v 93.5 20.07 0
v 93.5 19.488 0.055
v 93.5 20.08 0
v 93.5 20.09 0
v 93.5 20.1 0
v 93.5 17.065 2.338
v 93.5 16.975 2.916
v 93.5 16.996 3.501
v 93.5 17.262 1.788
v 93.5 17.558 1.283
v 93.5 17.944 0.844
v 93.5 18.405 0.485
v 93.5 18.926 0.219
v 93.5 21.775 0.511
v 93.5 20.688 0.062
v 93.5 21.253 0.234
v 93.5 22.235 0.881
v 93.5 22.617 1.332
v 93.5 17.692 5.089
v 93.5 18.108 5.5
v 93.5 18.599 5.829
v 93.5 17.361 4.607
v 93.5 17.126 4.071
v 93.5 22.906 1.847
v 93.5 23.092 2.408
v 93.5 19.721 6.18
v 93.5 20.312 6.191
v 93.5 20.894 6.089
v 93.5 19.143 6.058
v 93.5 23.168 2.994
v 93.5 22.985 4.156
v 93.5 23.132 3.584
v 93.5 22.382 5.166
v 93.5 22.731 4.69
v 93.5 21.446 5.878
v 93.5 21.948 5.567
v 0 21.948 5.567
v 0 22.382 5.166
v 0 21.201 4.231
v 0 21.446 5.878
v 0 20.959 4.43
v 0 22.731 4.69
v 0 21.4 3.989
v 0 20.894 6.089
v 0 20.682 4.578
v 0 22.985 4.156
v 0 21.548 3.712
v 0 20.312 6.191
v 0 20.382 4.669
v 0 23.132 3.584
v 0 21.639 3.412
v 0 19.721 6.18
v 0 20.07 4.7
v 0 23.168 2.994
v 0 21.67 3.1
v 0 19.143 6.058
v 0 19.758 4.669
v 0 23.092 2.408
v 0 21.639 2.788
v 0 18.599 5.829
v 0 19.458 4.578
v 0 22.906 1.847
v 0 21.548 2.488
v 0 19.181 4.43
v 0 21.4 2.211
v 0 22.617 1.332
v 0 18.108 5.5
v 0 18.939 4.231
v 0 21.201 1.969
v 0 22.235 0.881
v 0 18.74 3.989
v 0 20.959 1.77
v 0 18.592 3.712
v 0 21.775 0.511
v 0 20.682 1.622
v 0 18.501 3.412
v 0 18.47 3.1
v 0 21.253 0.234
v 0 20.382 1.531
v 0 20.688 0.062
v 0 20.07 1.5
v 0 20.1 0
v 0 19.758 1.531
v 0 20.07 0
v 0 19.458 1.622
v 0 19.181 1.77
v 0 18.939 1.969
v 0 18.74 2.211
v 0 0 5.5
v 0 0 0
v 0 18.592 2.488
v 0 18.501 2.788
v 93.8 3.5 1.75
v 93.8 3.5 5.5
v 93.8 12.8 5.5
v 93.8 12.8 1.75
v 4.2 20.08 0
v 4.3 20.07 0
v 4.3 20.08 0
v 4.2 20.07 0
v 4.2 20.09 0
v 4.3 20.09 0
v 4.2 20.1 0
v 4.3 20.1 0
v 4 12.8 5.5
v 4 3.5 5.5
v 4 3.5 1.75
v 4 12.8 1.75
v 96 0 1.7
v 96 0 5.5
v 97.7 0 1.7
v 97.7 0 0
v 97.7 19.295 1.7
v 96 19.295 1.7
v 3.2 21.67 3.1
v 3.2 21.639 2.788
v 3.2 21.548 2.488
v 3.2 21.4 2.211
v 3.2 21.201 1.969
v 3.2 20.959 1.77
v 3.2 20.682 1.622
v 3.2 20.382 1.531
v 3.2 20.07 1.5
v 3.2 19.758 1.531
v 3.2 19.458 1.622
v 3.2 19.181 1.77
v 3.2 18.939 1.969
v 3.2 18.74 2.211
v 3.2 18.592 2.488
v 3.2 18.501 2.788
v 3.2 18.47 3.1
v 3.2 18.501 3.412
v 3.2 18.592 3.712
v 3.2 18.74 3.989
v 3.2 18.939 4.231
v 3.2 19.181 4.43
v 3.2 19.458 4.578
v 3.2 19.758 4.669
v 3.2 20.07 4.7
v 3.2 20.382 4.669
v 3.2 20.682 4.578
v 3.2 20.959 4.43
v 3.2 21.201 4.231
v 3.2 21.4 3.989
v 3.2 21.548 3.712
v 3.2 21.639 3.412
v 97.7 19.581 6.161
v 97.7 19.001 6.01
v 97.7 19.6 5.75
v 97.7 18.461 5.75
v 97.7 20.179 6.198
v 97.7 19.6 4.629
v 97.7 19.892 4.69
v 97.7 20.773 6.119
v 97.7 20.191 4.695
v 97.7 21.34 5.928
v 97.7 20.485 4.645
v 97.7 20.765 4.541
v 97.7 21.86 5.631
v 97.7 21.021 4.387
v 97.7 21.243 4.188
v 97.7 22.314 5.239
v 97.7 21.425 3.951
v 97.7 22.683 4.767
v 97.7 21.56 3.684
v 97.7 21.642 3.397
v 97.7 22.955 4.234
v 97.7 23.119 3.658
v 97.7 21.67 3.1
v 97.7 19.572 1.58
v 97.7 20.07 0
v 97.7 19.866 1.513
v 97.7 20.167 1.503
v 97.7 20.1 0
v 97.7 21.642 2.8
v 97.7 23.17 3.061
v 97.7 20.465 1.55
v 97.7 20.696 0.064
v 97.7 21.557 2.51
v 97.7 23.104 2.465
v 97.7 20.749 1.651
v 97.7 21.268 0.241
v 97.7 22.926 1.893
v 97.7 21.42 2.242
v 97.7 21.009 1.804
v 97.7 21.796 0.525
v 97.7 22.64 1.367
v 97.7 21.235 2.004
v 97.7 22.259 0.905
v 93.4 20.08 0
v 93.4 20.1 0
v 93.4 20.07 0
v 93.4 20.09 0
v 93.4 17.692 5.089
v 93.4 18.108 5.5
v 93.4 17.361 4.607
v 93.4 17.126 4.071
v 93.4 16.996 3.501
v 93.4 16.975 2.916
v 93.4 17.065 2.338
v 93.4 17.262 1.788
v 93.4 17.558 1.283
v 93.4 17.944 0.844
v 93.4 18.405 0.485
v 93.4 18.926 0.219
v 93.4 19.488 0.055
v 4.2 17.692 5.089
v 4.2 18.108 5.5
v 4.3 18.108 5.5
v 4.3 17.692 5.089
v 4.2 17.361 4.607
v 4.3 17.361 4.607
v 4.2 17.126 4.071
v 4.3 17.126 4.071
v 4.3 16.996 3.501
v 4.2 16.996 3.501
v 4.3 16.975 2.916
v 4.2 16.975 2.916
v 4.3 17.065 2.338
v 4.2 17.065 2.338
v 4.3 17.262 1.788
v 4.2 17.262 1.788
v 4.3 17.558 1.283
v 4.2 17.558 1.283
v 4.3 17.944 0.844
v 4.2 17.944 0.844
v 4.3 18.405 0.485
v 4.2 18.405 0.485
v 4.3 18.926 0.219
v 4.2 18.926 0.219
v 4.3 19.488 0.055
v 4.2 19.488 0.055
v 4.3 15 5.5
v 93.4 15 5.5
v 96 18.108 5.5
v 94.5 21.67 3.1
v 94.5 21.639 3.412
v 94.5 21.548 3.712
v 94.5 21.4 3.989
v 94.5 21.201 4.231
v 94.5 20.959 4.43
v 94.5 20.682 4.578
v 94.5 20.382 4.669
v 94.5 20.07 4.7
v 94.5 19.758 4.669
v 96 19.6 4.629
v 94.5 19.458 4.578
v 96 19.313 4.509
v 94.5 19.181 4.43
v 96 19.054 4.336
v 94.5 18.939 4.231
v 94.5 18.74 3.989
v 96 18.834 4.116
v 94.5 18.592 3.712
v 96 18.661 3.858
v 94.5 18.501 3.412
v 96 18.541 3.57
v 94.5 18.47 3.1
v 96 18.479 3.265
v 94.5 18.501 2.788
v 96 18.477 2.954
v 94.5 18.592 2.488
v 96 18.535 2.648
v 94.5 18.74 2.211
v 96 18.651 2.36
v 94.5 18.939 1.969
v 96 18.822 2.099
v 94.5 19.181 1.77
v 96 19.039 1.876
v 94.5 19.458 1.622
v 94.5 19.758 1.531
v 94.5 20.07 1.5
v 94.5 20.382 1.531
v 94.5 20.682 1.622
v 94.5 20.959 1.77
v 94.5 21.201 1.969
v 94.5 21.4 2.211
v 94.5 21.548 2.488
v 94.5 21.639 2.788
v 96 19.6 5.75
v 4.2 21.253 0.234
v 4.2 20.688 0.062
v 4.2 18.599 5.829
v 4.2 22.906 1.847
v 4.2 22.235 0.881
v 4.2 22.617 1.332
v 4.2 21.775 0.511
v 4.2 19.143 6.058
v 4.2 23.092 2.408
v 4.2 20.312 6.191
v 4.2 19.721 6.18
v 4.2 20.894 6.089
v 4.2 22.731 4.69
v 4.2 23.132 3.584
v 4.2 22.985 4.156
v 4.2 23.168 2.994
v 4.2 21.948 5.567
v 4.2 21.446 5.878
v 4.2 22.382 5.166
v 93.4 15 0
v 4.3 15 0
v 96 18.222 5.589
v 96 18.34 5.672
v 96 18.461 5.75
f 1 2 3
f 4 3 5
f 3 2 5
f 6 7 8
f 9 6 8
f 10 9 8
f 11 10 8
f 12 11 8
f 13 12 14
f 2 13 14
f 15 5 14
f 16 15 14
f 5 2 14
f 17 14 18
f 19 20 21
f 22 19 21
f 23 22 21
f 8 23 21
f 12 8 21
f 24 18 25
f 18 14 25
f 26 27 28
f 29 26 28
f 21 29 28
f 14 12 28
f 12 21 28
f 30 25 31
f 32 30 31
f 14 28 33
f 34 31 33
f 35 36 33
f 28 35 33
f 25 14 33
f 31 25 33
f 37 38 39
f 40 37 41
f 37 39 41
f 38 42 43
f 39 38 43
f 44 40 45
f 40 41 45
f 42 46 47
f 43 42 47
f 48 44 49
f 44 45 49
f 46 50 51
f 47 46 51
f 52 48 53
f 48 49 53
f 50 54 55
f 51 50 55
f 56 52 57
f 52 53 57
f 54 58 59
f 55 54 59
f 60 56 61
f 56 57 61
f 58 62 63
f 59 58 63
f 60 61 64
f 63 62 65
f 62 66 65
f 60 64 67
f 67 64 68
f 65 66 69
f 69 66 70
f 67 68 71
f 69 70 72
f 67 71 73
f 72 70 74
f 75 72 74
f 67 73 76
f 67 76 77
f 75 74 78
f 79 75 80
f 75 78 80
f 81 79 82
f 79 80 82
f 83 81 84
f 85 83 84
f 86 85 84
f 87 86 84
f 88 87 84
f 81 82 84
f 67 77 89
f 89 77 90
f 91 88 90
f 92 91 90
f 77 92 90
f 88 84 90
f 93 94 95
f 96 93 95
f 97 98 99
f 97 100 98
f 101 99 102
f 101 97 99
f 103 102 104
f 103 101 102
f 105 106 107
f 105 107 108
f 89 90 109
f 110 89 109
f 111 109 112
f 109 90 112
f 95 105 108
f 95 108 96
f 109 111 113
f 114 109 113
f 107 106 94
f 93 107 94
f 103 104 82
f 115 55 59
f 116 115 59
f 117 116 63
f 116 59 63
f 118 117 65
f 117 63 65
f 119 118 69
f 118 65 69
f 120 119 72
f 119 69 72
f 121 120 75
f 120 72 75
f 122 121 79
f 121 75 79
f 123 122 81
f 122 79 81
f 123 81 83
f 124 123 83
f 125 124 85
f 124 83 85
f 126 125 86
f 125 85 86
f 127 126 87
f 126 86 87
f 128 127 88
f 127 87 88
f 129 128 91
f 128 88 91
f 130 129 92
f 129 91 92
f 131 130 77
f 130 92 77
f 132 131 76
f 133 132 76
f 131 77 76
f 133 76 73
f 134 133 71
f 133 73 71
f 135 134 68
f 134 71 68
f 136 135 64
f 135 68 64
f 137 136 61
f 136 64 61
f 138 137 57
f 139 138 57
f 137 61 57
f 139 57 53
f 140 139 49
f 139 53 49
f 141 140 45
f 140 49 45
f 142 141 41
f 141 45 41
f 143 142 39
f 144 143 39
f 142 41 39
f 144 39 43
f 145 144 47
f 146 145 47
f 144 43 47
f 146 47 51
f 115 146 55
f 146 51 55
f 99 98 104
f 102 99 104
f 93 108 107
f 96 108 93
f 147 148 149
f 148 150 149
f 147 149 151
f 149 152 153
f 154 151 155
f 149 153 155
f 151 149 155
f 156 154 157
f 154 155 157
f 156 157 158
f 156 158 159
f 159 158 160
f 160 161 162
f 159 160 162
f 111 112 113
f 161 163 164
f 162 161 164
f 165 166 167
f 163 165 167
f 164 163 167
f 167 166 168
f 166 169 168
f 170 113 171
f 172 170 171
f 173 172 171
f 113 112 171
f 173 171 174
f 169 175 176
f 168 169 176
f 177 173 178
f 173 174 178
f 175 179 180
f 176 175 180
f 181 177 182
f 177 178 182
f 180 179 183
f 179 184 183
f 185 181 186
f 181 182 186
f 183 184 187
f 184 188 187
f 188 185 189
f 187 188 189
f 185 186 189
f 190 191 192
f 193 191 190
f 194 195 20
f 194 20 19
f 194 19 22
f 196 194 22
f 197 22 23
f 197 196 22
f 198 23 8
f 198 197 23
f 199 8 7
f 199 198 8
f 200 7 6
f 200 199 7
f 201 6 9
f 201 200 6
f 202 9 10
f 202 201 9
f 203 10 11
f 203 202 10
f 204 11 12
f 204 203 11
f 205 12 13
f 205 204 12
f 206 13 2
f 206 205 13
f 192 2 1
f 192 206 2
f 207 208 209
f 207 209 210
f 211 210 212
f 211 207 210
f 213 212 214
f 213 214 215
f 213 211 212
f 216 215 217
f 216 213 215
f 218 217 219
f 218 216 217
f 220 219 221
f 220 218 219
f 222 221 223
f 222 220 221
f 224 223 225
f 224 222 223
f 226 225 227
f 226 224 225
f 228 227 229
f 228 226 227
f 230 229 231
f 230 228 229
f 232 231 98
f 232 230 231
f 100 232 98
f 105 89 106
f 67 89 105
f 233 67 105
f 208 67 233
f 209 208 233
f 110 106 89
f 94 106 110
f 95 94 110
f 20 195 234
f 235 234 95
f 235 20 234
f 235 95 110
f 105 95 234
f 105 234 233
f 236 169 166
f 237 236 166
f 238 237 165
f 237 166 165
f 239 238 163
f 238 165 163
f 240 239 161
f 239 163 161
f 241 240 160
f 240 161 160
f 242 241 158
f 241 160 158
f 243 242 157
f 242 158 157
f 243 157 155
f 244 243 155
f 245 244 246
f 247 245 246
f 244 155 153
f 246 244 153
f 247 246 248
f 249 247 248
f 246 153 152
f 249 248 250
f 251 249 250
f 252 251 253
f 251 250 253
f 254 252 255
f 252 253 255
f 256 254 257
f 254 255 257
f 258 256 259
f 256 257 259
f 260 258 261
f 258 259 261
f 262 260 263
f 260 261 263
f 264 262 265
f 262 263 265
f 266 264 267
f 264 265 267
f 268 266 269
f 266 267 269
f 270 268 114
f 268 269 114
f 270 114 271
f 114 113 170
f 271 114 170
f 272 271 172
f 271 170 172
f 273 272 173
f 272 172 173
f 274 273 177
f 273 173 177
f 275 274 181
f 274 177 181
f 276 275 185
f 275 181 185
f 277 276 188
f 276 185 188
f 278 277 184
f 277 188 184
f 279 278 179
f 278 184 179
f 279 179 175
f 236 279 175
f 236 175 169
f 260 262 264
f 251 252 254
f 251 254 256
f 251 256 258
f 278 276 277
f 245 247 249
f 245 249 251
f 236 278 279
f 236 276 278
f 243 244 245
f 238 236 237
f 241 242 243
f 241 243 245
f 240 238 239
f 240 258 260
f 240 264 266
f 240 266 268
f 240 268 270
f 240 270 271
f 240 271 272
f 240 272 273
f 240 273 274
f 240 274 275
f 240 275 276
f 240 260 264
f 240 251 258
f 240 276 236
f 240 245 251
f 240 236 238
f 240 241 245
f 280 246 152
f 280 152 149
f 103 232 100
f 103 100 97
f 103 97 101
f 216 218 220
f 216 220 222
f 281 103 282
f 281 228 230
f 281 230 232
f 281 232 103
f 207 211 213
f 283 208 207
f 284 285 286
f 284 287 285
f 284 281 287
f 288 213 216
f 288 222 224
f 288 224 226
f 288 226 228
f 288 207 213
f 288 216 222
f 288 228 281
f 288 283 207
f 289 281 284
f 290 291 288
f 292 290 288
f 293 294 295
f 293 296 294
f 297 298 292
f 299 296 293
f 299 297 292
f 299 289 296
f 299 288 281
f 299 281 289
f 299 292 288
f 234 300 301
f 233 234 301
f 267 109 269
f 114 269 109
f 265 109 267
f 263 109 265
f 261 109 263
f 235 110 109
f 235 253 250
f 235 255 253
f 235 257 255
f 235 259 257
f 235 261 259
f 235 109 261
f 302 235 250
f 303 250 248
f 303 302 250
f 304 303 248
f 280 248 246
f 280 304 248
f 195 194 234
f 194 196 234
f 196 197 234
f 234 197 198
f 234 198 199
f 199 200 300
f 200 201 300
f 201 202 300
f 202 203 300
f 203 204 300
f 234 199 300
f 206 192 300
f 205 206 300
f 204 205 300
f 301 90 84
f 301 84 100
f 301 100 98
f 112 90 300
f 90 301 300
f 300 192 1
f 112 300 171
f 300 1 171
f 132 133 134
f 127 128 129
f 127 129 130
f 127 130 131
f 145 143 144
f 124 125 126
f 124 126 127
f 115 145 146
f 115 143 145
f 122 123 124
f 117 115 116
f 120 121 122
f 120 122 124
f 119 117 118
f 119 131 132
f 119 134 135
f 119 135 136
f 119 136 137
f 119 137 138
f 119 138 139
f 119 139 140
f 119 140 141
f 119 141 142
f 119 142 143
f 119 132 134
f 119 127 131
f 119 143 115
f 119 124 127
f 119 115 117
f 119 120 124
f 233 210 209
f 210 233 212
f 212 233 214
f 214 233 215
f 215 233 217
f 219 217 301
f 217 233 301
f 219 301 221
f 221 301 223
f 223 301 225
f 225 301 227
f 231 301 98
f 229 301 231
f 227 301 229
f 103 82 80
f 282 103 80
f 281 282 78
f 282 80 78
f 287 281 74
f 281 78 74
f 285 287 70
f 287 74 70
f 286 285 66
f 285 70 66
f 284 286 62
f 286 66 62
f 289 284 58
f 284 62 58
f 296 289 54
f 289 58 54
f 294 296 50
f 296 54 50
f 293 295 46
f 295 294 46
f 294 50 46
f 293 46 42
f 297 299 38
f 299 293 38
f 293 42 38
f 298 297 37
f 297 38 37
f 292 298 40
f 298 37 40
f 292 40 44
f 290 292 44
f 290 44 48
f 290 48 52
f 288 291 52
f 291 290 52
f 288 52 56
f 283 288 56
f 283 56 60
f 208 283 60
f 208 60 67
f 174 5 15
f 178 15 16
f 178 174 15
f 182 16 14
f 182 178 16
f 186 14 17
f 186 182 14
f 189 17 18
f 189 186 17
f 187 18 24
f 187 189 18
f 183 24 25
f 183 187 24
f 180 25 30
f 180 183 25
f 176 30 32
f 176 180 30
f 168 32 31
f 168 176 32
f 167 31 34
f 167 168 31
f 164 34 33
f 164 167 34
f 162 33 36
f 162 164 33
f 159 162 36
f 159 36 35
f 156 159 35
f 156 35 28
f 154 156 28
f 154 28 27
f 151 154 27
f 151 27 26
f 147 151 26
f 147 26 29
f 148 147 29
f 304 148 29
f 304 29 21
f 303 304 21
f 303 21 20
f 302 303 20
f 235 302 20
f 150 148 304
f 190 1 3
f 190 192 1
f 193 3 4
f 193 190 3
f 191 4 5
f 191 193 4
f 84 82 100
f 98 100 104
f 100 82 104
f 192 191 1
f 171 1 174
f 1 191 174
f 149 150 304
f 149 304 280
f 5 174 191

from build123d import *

# Parameters (mm, degrees)
SKETCH011_W     = 19.6
SKETCH011_H     = 4.05
PAD007_DEPTH    = 1.7
SKETCH005_R     = 3.1
PAD004_DEPTH    = 4.3
SKETCH004_R     = 3.1
PAD003_DEPTH    = 4.3
PAD_DEPTH       = 5.5
SKETCH001_W     = 89.8
SKETCH001_H     = 9.3
POCKET_DEPTH    = 3.75
SKETCH006_R     = 3.1
PAD005_DEPTH    = 4.2
SKETCH010_R     = 1.6
POCKET002_DEPTH = 3.2
SKETCH008_R     = 3.1
PAD006_DEPTH    = 4.2
SKETCH009_R     = 1.6
POCKET001_DEPTH = 3.2


with BuildPart() as body006:
    # Sketch011 → Pad007 (new body)
    with BuildSketch(Plane.YZ.offset(97.7)):
        with Locations((9.8, 3.725)):
            Rectangle(SKETCH011_W, SKETCH011_H)
    extrude(amount=-PAD007_DEPTH)


with BuildPart() as body002:
    # Sketch005 → Pad004 (new body)
    with BuildSketch(Plane.YZ.offset(93.4)):
        with Locations((20.07, 3.1)):
            Circle(SKETCH005_R)
    extrude(amount=PAD004_DEPTH)


with BuildPart() as fusion:
    # Sketch004 → Pad003 (new body)
    with BuildSketch(Plane.YZ):
        with Locations((20.07, 3.1)):
            Circle(SKETCH004_R)
    extrude(amount=PAD003_DEPTH)

    # Fusion: union Body002
    add(body002.part)


with BuildPart() as cut:
    # Sketch → Pad (new body)
    with BuildSketch(Plane.XY):
        Polygon((0, 0), (97.7, 0), (97.7, 20.1), (93.4, 20.1), (93.4, 15), (4.3, 15), (4.3, 20.1), (0, 20.1), align=None)
    extrude(amount=PAD_DEPTH)

    # Sketch001 (on Face10 of Pad) → Pocket (cut)
    with BuildSketch(Plane.XY.offset(5.5)):
        with Locations((48.9, 8.15)):
            Rectangle(SKETCH001_W, SKETCH001_H)
    extrude(amount=-POCKET_DEPTH, mode=Mode.SUBTRACT)

    # Cut: cut Fusion
    add(fusion.part, mode=Mode.SUBTRACT)


with BuildPart() as fusion001:
    # Sketch006 → Pad005 (new body)
    with BuildSketch(Plane.YZ):
        with Locations((20.07, 3.1)):
            Circle(SKETCH006_R)
    extrude(amount=PAD005_DEPTH)

    # Sketch010 (on Face2 of Pad005) → Pocket002 (cut)
    with BuildSketch(Plane(origin=(0, 0, 0), x_dir=(0, 1, 0), z_dir=(-1, 0, 0))):
        with Locations((20.07, -3.1)):
            Circle(SKETCH010_R)
    extrude(amount=-POCKET002_DEPTH, mode=Mode.SUBTRACT)

    # Fusion001: union Cut
    add(cut.part)


with BuildPart() as cut001:
    # Sketch008 → Pad006 (new body)
    with BuildSketch(Plane.YZ.offset(97.7)):
        with Locations((20.07, 3.1)):
            Circle(SKETCH008_R)
    extrude(amount=-PAD006_DEPTH)

    # Sketch009 (on Face2 of Pad006) → Pocket001 (cut)
    with BuildSketch(Plane.YZ.offset(97.7)):
        with Locations((20.07, 3.1)):
            Circle(SKETCH009_R)
    extrude(amount=-POCKET001_DEPTH, mode=Mode.SUBTRACT)

    # Fusion002: union Fusion001
    add(fusion001.part)

    # Cut001: cut Body006
    add(body006.part, mode=Mode.SUBTRACT)


solid = cut001.part
